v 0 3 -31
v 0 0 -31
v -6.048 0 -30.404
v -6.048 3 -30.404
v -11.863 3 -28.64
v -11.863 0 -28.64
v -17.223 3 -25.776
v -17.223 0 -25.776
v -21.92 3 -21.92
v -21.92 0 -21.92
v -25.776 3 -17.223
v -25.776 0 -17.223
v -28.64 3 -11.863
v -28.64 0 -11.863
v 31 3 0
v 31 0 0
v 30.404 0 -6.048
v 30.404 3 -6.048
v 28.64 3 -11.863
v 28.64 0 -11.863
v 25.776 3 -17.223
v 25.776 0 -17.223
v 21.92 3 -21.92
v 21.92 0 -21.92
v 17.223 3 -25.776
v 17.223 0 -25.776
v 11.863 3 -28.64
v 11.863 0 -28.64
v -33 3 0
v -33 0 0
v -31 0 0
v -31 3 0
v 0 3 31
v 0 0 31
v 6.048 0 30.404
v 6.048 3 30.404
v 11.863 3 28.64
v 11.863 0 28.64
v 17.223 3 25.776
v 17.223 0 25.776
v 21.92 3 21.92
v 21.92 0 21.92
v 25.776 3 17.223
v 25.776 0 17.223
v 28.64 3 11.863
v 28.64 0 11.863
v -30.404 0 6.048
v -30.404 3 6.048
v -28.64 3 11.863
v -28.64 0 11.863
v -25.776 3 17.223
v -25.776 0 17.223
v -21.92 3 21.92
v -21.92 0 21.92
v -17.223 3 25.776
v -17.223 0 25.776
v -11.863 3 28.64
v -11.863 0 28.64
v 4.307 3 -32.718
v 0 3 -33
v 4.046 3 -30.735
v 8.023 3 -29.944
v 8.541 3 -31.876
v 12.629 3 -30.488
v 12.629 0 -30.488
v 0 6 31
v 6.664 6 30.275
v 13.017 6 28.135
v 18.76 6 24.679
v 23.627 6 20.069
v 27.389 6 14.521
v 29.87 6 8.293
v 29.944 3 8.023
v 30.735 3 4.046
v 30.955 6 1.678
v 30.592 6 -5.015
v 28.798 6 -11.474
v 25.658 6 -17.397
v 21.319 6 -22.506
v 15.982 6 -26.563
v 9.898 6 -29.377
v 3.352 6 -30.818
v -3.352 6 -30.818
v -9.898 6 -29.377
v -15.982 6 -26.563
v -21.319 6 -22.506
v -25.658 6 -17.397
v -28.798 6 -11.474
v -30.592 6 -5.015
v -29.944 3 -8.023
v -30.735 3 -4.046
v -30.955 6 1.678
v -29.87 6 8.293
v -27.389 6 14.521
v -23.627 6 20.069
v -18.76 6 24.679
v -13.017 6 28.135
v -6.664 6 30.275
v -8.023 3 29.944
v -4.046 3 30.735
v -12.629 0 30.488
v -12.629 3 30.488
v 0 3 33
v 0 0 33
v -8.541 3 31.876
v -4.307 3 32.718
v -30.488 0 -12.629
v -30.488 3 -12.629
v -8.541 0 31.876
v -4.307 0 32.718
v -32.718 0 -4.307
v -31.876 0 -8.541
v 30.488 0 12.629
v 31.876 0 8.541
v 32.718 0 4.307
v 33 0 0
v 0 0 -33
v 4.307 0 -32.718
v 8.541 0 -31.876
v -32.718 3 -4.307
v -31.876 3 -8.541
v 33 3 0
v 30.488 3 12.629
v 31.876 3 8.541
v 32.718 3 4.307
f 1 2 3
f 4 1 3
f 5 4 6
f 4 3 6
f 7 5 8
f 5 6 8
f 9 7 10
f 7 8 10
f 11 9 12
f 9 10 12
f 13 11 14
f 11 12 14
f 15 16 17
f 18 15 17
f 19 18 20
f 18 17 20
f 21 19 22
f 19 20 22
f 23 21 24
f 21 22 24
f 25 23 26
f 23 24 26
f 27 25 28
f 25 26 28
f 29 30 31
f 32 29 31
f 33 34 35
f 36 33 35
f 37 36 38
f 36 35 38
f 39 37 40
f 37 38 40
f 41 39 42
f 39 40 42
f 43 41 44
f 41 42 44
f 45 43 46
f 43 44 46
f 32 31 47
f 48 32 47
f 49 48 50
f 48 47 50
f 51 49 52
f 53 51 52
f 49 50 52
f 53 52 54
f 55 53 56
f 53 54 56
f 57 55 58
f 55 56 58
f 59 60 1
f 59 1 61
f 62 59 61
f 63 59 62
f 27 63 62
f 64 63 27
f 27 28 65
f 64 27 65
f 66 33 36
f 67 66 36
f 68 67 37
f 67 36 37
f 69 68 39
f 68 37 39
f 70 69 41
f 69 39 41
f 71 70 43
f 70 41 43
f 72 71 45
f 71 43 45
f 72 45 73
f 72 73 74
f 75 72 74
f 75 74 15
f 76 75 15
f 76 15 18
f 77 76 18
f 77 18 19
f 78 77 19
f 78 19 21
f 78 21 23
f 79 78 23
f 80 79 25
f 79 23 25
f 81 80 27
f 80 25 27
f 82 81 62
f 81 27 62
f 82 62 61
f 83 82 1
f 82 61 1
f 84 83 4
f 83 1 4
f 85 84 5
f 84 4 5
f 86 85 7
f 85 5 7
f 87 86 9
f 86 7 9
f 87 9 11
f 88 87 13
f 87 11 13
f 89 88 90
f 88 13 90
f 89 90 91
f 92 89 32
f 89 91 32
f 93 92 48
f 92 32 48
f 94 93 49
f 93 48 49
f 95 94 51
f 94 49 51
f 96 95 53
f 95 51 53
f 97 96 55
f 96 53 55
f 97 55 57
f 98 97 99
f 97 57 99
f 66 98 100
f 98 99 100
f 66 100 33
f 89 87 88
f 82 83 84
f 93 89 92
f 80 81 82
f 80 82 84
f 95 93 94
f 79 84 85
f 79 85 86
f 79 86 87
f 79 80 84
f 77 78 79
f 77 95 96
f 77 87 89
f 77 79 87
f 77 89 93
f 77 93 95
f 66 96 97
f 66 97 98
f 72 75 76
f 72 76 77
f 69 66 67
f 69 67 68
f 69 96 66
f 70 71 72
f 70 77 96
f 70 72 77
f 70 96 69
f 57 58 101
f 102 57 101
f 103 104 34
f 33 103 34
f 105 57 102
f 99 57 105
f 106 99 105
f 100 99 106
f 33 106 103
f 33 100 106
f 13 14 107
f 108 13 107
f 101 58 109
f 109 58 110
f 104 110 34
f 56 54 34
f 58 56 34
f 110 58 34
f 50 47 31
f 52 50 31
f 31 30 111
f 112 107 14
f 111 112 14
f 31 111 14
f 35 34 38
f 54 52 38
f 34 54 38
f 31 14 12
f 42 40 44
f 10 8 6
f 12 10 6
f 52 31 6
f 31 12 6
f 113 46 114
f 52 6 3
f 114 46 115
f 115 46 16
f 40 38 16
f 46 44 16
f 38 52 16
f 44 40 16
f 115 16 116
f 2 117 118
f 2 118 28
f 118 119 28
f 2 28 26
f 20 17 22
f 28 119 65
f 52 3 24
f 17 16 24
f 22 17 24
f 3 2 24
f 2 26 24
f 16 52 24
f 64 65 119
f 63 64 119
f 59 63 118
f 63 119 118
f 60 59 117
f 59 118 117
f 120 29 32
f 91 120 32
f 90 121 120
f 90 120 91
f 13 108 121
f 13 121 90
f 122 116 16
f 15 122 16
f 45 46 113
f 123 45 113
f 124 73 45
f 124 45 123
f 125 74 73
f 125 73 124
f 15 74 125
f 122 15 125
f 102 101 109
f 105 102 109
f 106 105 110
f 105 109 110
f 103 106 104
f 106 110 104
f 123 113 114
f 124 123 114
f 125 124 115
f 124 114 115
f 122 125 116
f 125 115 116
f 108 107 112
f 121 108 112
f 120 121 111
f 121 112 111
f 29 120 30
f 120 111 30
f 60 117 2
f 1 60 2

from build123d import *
from build123d.topology import SkipClean

# Parameters (mm, degrees)
SKETCH8_R            = 31
BOSS_EXTRUDE9_DEPTH  = 3
SKETCH11_R           = 31
BOSS_EXTRUDE10_DEPTH = 3


with BuildPart() as part:
    # Sketch8 → Boss-Extrude9 (new body)
    with BuildSketch(Plane(origin=(0, 0, 0), x_dir=(1, 0, 0), z_dir=(0, 1, 0))):
        Circle(SKETCH8_R)
        with BuildLine():
            ThreePointArc((0, -31), (-6.047799982, -30.404343693), (-11.863186403, -28.640265508))
            Line((-11.863186403, -28.640265508), (-12.628553268, -30.488024573))
            ThreePointArc((-12.628553268, -30.488024573), (-6.437980627, -32.365914253), (0, -33))
            Line((0, -33), (0, -31))
        make_face()
        with BuildLine():
            ThreePointArc((-31, 0), (-30.404343693, 6.047799982), (-28.640265508, 11.863186403))
            Line((-28.640265508, 11.863186403), (-30.488024573, 12.628553268))
            ThreePointArc((-30.488024573, 12.628553268), (-32.365914253, 6.437980627), (-33, 0))
            Line((-33, 0), (-31, 0))
        make_face()
        with BuildLine():
            ThreePointArc((12.628553268, 30.488024573), (6.437980627, 32.365914253), (0, 33))
            Line((0, 33), (0, 31))
            ThreePointArc((0, 31), (6.047799982, 30.404343693), (11.863186403, 28.640265508))
            Line((11.863186403, 28.640265508), (12.628553268, 30.488024573))
        make_face()
        with BuildLine():
            Line((33, 0), (31, 0))
            ThreePointArc((31, 0), (30.404343693, -6.047799982), (28.640265508, -11.863186403))
            Line((28.640265508, -11.863186403), (30.488024573, -12.628553268))
            ThreePointArc((30.488024573, -12.628553268), (32.365914253, -6.437980627), (33, 0))
        make_face()
    extrude(amount=BOSS_EXTRUDE9_DEPTH)

    # Sketch11 → Boss-Extrude10 (add)
    with SkipClean():  # the faces are left unmerged after this step: merging them gives an invalid solid
        with BuildSketch(Plane(origin=(0, 3, 0), x_dir=(1, 0, 0), z_dir=(0, 1, 0))):
            with Locations(Location((0, 0, 0), (0, 0, 270))):
                Circle(SKETCH11_R)
        extrude(amount=BOSS_EXTRUDE10_DEPTH)


solid = part.part
